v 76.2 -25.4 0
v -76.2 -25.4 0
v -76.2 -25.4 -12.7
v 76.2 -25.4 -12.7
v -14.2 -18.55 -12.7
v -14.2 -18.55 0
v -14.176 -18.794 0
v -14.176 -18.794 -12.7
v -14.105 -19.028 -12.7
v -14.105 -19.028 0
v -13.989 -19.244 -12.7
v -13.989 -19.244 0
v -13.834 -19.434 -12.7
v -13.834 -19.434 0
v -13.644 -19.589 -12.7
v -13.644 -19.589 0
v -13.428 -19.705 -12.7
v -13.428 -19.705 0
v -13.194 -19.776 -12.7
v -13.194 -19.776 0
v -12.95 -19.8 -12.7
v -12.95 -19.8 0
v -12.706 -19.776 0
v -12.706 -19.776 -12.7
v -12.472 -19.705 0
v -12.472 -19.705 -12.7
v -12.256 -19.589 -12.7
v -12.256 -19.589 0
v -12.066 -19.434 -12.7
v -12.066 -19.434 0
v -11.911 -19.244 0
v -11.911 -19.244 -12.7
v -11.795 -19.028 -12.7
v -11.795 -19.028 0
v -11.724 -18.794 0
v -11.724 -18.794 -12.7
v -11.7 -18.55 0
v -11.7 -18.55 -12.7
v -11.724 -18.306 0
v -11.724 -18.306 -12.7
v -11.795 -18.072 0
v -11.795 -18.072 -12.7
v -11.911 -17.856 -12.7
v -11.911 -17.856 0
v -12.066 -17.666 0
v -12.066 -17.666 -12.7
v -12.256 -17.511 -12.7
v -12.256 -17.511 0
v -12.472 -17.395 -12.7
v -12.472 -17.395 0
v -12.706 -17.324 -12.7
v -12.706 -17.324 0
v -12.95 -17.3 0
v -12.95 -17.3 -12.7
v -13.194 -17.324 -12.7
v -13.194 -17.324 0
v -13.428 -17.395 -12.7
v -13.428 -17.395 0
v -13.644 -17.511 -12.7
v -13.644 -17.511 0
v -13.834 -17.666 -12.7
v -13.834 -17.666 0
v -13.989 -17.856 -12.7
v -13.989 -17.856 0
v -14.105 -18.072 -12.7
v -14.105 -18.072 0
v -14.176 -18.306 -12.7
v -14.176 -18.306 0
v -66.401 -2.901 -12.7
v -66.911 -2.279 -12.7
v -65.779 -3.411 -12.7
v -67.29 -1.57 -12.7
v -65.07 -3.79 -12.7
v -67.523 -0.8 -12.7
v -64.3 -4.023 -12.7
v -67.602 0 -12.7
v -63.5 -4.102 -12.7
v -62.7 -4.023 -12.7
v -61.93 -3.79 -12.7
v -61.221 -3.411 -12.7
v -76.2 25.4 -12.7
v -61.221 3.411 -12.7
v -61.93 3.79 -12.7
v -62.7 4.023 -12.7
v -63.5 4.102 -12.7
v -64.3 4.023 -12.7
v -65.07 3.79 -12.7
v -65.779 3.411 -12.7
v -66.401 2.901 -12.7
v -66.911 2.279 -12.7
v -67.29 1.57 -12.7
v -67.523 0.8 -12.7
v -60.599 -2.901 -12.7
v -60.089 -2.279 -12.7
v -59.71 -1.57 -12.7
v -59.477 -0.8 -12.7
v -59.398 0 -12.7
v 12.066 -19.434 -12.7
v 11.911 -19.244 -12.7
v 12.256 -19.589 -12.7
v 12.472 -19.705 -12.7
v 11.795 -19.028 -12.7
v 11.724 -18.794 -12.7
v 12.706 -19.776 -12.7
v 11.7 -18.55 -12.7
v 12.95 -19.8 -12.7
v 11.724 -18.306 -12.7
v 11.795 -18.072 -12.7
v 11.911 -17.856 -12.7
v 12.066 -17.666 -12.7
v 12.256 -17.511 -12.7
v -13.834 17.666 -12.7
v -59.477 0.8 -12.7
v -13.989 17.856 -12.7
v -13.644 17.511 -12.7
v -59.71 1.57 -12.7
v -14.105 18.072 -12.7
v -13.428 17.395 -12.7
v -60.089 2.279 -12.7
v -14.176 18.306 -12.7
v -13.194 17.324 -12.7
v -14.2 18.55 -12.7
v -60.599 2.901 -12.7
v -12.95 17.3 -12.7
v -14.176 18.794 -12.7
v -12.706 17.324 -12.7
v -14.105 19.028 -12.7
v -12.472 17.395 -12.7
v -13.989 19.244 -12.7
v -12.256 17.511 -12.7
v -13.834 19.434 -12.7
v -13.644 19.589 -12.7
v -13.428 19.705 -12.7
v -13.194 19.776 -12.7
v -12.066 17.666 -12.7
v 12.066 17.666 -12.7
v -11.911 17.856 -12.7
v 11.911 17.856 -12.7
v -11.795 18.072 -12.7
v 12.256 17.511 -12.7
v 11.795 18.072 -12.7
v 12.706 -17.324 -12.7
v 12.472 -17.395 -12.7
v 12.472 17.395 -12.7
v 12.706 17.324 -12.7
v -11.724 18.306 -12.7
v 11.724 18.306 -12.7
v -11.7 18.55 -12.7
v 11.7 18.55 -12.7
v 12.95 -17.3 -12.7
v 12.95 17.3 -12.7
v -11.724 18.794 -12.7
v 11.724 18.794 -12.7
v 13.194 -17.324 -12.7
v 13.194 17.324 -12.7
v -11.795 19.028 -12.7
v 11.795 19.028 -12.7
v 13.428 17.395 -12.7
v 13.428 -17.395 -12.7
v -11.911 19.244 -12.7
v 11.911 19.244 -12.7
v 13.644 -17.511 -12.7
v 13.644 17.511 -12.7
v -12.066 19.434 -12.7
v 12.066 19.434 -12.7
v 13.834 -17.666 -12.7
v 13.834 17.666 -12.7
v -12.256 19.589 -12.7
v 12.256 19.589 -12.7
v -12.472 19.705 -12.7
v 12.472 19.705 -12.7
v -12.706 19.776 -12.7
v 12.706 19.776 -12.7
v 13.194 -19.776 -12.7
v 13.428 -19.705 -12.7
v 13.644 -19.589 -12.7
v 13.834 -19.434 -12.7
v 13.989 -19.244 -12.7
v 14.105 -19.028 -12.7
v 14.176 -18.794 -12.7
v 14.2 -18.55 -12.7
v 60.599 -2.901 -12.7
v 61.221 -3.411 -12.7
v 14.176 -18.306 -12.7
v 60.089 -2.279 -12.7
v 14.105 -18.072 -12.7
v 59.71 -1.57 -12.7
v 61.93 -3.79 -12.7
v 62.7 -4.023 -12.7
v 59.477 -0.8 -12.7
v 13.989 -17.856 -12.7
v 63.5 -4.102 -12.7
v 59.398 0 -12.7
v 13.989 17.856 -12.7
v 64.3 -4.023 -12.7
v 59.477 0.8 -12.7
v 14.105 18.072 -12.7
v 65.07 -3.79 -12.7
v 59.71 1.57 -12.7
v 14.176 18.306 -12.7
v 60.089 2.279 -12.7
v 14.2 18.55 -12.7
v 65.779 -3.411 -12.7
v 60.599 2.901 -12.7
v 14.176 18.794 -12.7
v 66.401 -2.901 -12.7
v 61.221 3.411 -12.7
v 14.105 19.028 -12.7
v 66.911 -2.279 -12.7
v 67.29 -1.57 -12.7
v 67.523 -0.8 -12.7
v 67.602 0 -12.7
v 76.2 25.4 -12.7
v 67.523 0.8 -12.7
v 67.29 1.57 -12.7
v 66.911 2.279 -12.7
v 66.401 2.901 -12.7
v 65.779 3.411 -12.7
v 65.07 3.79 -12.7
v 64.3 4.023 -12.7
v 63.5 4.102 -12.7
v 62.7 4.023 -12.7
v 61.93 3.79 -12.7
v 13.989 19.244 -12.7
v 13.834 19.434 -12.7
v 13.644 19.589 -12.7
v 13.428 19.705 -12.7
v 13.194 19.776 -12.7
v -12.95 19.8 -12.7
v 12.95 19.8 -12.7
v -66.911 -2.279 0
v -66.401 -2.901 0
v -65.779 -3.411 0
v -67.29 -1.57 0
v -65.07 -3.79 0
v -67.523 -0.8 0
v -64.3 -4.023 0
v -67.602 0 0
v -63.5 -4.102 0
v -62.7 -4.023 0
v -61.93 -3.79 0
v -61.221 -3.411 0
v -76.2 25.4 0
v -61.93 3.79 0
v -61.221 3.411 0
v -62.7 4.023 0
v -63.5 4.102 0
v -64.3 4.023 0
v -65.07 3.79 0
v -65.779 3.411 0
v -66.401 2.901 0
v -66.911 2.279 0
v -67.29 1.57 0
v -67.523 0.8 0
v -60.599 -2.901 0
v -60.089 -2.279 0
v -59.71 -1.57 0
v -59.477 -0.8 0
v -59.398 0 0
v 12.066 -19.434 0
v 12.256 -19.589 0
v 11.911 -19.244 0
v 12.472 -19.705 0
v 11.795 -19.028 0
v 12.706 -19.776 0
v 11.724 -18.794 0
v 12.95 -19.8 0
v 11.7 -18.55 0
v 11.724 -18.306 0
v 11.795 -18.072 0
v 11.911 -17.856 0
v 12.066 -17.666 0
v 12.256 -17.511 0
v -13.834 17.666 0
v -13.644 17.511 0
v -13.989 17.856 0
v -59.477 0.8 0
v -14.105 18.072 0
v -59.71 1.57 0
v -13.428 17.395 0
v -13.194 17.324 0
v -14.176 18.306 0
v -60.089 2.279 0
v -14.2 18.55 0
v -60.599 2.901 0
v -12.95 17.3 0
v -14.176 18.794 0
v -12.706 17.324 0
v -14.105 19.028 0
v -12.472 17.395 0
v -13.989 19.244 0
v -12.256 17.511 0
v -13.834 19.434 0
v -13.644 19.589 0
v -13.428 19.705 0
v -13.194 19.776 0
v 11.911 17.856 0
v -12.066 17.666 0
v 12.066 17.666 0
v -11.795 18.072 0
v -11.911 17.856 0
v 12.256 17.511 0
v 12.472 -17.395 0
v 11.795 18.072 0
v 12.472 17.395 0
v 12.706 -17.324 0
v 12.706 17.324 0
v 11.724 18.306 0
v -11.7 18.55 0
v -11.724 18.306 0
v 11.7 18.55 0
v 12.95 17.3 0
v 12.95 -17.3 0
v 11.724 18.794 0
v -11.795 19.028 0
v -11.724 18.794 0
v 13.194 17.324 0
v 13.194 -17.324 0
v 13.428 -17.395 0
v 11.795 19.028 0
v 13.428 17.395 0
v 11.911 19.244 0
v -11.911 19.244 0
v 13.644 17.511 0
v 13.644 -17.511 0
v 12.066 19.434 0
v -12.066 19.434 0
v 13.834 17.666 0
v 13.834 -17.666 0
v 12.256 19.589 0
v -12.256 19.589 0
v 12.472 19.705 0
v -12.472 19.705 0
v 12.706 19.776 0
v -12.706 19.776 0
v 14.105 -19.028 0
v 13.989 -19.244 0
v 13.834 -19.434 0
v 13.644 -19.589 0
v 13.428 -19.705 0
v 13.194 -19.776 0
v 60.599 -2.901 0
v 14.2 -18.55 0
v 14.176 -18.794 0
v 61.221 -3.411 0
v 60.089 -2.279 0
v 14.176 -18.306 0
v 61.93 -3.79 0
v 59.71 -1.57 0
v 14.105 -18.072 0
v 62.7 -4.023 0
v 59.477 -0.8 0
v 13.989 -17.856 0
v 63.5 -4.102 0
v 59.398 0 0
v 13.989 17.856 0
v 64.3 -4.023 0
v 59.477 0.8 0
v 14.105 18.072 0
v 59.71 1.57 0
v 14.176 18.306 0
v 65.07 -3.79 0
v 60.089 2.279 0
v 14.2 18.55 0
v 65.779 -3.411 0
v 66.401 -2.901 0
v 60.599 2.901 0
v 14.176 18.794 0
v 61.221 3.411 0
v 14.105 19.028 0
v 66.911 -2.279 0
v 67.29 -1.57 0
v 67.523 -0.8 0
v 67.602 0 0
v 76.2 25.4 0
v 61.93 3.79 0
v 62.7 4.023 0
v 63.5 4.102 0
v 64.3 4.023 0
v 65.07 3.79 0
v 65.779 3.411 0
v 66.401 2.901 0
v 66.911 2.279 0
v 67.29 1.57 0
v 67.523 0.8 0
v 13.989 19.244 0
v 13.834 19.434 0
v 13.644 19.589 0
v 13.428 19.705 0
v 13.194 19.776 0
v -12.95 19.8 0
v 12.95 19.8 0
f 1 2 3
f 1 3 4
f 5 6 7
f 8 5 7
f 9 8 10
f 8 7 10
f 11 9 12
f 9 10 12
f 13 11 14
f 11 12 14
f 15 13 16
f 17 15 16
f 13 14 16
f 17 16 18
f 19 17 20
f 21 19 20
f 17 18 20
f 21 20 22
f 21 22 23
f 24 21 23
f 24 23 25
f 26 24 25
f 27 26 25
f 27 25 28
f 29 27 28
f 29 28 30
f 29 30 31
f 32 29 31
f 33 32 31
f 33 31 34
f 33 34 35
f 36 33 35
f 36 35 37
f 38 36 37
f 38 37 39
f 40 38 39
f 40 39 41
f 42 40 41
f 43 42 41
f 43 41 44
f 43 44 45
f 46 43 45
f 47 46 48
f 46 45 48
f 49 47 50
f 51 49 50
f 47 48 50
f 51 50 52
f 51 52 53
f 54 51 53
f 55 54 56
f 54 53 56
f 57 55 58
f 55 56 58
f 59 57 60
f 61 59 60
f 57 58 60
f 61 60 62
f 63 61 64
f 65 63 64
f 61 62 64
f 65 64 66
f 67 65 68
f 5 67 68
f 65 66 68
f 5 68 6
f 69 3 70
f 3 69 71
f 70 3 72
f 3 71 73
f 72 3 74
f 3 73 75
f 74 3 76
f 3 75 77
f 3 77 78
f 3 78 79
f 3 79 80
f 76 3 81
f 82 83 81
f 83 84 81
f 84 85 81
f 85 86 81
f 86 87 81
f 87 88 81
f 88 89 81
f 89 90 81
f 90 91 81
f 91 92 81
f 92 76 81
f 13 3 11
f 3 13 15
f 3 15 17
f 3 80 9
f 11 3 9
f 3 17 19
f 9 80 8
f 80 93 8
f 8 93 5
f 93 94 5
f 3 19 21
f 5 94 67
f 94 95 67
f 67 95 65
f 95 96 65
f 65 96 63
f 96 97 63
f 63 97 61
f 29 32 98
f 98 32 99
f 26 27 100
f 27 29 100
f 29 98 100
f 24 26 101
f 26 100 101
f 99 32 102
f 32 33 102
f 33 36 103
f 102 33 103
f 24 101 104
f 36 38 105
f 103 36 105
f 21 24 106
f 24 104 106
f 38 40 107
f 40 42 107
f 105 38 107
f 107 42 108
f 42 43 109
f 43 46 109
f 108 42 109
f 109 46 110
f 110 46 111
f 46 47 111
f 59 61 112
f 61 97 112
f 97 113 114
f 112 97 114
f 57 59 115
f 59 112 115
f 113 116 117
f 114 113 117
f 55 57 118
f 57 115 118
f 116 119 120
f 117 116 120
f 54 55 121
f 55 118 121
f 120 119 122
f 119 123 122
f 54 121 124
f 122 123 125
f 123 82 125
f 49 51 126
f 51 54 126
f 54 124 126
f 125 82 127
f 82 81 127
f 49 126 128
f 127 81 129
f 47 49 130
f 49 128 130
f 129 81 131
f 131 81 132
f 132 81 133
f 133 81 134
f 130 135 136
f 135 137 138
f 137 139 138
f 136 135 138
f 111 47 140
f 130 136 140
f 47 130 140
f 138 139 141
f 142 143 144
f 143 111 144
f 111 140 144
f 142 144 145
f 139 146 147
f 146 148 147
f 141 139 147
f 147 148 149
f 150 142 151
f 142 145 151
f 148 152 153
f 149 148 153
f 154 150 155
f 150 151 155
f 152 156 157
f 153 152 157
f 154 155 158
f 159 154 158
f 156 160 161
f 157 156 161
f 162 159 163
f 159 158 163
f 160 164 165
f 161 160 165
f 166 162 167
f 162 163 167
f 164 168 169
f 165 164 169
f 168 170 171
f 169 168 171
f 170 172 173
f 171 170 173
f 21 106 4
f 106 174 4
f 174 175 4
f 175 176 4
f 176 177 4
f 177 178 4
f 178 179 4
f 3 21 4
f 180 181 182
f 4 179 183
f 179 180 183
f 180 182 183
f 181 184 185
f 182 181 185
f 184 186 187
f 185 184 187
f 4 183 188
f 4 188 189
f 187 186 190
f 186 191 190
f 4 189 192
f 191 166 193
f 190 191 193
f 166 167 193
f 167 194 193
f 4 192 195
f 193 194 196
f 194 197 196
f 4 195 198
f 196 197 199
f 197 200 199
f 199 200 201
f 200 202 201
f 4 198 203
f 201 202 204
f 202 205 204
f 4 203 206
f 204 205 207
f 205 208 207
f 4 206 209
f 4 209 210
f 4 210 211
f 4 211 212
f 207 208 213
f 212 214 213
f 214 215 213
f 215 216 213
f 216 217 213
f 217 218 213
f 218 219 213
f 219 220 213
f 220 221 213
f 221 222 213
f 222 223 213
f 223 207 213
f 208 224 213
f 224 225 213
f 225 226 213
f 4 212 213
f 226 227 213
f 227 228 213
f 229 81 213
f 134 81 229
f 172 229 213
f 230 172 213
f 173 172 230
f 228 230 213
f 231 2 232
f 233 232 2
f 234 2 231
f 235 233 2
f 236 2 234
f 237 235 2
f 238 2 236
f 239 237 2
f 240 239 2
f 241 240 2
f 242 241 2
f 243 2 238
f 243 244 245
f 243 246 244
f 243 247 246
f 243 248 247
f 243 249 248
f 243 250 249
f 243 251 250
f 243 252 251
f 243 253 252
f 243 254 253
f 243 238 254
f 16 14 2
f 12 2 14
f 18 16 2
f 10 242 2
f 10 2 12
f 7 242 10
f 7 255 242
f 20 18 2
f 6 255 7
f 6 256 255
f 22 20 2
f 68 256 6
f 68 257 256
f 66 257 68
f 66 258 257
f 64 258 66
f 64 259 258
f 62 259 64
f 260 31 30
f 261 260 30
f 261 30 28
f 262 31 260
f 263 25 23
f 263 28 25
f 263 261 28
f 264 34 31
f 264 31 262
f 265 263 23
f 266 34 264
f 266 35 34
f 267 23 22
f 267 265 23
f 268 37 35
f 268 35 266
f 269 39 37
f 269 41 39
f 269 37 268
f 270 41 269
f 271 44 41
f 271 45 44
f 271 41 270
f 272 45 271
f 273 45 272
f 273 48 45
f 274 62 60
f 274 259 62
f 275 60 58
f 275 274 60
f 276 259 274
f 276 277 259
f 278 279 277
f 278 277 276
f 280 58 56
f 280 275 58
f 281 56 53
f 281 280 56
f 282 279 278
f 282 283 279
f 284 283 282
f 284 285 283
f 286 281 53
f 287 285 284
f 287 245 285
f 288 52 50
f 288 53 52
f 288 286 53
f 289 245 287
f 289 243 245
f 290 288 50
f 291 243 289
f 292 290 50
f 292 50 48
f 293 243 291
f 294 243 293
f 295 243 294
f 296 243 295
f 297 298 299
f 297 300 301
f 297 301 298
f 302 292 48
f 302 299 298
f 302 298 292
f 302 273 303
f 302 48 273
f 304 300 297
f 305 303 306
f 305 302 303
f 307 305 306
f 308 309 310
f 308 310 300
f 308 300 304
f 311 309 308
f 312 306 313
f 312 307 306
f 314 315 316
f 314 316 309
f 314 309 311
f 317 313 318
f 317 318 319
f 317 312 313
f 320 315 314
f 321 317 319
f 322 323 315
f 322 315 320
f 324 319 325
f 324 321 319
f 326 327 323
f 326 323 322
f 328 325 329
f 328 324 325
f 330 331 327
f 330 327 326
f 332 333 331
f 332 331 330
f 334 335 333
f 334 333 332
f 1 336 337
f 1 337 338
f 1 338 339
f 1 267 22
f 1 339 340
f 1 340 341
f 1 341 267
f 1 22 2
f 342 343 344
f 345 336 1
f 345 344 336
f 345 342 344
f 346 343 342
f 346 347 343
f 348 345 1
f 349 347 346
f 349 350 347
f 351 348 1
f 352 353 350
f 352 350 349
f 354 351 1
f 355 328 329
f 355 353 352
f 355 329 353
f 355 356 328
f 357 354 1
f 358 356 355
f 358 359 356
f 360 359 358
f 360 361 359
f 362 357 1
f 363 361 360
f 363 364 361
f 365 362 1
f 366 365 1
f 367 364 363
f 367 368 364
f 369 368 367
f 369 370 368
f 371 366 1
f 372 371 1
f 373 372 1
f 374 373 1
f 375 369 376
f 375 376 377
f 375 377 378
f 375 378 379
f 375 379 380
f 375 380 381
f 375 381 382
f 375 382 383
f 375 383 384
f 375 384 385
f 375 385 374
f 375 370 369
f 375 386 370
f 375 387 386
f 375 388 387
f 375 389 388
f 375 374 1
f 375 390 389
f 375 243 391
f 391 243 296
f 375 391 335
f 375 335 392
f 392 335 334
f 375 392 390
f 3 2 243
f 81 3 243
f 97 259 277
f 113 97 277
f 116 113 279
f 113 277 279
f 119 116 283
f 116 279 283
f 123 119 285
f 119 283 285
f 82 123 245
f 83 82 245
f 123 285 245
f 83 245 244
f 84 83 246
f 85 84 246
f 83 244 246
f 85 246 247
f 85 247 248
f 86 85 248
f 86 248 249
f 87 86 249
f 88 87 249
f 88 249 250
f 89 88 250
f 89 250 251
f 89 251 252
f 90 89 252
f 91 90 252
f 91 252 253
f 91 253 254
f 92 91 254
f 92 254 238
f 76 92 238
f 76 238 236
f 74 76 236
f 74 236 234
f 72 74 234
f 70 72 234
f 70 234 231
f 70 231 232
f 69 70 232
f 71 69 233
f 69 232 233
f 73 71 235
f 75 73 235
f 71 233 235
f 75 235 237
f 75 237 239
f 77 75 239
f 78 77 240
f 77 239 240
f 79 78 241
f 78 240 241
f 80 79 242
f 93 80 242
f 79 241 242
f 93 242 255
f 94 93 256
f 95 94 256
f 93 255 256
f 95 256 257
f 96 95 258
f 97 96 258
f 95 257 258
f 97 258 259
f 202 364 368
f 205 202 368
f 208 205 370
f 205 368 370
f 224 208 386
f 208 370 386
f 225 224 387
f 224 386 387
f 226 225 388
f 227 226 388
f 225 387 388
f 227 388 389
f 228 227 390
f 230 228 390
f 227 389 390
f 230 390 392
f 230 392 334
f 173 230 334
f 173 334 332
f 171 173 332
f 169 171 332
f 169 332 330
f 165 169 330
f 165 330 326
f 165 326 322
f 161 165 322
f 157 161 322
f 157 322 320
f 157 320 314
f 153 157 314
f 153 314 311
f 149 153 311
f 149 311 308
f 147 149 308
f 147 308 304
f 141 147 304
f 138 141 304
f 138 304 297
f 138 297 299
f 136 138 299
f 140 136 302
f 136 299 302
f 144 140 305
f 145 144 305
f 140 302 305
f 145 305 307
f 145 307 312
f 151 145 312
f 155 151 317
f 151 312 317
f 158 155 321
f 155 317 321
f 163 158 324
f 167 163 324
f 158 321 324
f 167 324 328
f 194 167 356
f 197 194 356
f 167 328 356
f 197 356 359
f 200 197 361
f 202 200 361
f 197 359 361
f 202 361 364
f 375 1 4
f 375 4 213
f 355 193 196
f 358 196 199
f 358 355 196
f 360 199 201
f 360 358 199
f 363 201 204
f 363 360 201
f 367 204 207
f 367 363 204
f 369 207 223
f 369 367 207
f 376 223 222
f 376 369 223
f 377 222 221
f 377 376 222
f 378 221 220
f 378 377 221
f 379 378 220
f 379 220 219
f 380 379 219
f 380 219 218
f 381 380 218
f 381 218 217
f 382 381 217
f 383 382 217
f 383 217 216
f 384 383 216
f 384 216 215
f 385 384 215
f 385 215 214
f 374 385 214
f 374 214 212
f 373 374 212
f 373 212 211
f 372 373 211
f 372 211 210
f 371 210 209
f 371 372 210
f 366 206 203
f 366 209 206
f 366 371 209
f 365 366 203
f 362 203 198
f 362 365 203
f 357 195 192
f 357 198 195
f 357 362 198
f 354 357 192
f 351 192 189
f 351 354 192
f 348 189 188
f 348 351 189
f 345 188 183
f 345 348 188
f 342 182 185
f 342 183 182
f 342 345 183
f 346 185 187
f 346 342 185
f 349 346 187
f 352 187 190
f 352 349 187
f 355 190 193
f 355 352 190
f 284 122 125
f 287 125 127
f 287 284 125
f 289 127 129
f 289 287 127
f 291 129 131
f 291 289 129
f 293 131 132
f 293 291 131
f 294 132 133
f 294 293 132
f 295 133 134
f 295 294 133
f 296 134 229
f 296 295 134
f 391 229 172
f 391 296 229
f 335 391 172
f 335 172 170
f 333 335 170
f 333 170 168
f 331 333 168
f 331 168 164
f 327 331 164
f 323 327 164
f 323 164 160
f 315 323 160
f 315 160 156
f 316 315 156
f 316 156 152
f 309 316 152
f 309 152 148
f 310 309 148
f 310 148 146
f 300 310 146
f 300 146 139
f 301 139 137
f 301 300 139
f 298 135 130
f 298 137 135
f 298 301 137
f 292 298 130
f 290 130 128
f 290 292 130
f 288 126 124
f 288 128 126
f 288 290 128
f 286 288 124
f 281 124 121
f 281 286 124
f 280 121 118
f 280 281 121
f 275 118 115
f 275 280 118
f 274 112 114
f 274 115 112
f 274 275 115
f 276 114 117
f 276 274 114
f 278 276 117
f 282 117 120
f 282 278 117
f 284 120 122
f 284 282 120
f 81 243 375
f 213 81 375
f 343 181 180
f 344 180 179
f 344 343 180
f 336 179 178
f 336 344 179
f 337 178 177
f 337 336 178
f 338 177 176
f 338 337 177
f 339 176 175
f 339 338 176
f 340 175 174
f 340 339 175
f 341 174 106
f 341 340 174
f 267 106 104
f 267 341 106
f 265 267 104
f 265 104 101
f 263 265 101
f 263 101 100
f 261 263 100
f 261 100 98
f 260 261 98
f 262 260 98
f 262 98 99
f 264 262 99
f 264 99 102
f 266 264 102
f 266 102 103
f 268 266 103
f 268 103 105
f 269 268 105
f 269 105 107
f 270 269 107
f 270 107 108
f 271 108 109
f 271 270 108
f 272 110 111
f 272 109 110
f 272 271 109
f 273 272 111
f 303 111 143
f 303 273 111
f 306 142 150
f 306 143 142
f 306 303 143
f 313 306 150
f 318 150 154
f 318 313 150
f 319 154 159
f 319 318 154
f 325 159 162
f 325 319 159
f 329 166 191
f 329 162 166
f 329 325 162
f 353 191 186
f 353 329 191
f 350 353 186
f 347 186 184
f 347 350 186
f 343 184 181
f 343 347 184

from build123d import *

# Parameters (mm, degrees)
SKETCH_W                  = 152.4
SKETCH_H                  = 50.8
PAD_DEPTH                 = 12.7
SKETCH001_R               = 4.1021
POCKET_DEPTH              = 334.99087
SKETCH002_R               = 1.25
HOLE_DEPTH                = 334.99087
SKETCH002_MIRRORED001_2_R = 1.25
HOLE_MIRRORED001_2_DEPTH  = 334.99087


with BuildPart() as part:
    # Sketch → Pad (new body)
    with BuildSketch(Plane.XY):
        Rectangle(SKETCH_W, SKETCH_H)
    extrude(amount=-PAD_DEPTH)

    # Sketch001 (on Face5 of Pad) → Pocket (cut, through all)
    with BuildSketch(Plane.XY):
        with Locations((-63.5, 0)):
            Circle(SKETCH001_R)
    pocket = extrude(amount=-POCKET_DEPTH, mode=Mode.SUBTRACT)

    # Mirrored: Pocket across YZ
    add(pocket.mirror(Plane.YZ), mode=Mode.SUBTRACT)

    # Sketch002 (on Face4 of Mirrored) → Hole (cut, through all)
    with BuildSketch(Plane.XY):
        with Locations((12.95, 18.55)):
            Circle(SKETCH002_R)
    hole = extrude(amount=-HOLE_DEPTH, mode=Mode.SUBTRACT)

    # Sketch002 Mirrored001 2 → Hole Mirrored001 2 (cut, through all)
    with BuildSketch(Plane(origin=(0, 0, 0), x_dir=(-1, 0, 0), z_dir=(0, 0, -1))):
        with Locations((12.95, 18.55)):
            Circle(SKETCH002_MIRRORED001_2_R)
    hole_mirrored001_2 = extrude(amount=HOLE_MIRRORED001_2_DEPTH, mode=Mode.SUBTRACT)

    # Mirrored002: Hole, Hole Mirrored001 2 across XZ
    add(hole.mirror(Plane.XZ), mode=Mode.SUBTRACT)
    add(hole_mirrored001_2.mirror(Plane.XZ), mode=Mode.SUBTRACT)


solid = part.part
